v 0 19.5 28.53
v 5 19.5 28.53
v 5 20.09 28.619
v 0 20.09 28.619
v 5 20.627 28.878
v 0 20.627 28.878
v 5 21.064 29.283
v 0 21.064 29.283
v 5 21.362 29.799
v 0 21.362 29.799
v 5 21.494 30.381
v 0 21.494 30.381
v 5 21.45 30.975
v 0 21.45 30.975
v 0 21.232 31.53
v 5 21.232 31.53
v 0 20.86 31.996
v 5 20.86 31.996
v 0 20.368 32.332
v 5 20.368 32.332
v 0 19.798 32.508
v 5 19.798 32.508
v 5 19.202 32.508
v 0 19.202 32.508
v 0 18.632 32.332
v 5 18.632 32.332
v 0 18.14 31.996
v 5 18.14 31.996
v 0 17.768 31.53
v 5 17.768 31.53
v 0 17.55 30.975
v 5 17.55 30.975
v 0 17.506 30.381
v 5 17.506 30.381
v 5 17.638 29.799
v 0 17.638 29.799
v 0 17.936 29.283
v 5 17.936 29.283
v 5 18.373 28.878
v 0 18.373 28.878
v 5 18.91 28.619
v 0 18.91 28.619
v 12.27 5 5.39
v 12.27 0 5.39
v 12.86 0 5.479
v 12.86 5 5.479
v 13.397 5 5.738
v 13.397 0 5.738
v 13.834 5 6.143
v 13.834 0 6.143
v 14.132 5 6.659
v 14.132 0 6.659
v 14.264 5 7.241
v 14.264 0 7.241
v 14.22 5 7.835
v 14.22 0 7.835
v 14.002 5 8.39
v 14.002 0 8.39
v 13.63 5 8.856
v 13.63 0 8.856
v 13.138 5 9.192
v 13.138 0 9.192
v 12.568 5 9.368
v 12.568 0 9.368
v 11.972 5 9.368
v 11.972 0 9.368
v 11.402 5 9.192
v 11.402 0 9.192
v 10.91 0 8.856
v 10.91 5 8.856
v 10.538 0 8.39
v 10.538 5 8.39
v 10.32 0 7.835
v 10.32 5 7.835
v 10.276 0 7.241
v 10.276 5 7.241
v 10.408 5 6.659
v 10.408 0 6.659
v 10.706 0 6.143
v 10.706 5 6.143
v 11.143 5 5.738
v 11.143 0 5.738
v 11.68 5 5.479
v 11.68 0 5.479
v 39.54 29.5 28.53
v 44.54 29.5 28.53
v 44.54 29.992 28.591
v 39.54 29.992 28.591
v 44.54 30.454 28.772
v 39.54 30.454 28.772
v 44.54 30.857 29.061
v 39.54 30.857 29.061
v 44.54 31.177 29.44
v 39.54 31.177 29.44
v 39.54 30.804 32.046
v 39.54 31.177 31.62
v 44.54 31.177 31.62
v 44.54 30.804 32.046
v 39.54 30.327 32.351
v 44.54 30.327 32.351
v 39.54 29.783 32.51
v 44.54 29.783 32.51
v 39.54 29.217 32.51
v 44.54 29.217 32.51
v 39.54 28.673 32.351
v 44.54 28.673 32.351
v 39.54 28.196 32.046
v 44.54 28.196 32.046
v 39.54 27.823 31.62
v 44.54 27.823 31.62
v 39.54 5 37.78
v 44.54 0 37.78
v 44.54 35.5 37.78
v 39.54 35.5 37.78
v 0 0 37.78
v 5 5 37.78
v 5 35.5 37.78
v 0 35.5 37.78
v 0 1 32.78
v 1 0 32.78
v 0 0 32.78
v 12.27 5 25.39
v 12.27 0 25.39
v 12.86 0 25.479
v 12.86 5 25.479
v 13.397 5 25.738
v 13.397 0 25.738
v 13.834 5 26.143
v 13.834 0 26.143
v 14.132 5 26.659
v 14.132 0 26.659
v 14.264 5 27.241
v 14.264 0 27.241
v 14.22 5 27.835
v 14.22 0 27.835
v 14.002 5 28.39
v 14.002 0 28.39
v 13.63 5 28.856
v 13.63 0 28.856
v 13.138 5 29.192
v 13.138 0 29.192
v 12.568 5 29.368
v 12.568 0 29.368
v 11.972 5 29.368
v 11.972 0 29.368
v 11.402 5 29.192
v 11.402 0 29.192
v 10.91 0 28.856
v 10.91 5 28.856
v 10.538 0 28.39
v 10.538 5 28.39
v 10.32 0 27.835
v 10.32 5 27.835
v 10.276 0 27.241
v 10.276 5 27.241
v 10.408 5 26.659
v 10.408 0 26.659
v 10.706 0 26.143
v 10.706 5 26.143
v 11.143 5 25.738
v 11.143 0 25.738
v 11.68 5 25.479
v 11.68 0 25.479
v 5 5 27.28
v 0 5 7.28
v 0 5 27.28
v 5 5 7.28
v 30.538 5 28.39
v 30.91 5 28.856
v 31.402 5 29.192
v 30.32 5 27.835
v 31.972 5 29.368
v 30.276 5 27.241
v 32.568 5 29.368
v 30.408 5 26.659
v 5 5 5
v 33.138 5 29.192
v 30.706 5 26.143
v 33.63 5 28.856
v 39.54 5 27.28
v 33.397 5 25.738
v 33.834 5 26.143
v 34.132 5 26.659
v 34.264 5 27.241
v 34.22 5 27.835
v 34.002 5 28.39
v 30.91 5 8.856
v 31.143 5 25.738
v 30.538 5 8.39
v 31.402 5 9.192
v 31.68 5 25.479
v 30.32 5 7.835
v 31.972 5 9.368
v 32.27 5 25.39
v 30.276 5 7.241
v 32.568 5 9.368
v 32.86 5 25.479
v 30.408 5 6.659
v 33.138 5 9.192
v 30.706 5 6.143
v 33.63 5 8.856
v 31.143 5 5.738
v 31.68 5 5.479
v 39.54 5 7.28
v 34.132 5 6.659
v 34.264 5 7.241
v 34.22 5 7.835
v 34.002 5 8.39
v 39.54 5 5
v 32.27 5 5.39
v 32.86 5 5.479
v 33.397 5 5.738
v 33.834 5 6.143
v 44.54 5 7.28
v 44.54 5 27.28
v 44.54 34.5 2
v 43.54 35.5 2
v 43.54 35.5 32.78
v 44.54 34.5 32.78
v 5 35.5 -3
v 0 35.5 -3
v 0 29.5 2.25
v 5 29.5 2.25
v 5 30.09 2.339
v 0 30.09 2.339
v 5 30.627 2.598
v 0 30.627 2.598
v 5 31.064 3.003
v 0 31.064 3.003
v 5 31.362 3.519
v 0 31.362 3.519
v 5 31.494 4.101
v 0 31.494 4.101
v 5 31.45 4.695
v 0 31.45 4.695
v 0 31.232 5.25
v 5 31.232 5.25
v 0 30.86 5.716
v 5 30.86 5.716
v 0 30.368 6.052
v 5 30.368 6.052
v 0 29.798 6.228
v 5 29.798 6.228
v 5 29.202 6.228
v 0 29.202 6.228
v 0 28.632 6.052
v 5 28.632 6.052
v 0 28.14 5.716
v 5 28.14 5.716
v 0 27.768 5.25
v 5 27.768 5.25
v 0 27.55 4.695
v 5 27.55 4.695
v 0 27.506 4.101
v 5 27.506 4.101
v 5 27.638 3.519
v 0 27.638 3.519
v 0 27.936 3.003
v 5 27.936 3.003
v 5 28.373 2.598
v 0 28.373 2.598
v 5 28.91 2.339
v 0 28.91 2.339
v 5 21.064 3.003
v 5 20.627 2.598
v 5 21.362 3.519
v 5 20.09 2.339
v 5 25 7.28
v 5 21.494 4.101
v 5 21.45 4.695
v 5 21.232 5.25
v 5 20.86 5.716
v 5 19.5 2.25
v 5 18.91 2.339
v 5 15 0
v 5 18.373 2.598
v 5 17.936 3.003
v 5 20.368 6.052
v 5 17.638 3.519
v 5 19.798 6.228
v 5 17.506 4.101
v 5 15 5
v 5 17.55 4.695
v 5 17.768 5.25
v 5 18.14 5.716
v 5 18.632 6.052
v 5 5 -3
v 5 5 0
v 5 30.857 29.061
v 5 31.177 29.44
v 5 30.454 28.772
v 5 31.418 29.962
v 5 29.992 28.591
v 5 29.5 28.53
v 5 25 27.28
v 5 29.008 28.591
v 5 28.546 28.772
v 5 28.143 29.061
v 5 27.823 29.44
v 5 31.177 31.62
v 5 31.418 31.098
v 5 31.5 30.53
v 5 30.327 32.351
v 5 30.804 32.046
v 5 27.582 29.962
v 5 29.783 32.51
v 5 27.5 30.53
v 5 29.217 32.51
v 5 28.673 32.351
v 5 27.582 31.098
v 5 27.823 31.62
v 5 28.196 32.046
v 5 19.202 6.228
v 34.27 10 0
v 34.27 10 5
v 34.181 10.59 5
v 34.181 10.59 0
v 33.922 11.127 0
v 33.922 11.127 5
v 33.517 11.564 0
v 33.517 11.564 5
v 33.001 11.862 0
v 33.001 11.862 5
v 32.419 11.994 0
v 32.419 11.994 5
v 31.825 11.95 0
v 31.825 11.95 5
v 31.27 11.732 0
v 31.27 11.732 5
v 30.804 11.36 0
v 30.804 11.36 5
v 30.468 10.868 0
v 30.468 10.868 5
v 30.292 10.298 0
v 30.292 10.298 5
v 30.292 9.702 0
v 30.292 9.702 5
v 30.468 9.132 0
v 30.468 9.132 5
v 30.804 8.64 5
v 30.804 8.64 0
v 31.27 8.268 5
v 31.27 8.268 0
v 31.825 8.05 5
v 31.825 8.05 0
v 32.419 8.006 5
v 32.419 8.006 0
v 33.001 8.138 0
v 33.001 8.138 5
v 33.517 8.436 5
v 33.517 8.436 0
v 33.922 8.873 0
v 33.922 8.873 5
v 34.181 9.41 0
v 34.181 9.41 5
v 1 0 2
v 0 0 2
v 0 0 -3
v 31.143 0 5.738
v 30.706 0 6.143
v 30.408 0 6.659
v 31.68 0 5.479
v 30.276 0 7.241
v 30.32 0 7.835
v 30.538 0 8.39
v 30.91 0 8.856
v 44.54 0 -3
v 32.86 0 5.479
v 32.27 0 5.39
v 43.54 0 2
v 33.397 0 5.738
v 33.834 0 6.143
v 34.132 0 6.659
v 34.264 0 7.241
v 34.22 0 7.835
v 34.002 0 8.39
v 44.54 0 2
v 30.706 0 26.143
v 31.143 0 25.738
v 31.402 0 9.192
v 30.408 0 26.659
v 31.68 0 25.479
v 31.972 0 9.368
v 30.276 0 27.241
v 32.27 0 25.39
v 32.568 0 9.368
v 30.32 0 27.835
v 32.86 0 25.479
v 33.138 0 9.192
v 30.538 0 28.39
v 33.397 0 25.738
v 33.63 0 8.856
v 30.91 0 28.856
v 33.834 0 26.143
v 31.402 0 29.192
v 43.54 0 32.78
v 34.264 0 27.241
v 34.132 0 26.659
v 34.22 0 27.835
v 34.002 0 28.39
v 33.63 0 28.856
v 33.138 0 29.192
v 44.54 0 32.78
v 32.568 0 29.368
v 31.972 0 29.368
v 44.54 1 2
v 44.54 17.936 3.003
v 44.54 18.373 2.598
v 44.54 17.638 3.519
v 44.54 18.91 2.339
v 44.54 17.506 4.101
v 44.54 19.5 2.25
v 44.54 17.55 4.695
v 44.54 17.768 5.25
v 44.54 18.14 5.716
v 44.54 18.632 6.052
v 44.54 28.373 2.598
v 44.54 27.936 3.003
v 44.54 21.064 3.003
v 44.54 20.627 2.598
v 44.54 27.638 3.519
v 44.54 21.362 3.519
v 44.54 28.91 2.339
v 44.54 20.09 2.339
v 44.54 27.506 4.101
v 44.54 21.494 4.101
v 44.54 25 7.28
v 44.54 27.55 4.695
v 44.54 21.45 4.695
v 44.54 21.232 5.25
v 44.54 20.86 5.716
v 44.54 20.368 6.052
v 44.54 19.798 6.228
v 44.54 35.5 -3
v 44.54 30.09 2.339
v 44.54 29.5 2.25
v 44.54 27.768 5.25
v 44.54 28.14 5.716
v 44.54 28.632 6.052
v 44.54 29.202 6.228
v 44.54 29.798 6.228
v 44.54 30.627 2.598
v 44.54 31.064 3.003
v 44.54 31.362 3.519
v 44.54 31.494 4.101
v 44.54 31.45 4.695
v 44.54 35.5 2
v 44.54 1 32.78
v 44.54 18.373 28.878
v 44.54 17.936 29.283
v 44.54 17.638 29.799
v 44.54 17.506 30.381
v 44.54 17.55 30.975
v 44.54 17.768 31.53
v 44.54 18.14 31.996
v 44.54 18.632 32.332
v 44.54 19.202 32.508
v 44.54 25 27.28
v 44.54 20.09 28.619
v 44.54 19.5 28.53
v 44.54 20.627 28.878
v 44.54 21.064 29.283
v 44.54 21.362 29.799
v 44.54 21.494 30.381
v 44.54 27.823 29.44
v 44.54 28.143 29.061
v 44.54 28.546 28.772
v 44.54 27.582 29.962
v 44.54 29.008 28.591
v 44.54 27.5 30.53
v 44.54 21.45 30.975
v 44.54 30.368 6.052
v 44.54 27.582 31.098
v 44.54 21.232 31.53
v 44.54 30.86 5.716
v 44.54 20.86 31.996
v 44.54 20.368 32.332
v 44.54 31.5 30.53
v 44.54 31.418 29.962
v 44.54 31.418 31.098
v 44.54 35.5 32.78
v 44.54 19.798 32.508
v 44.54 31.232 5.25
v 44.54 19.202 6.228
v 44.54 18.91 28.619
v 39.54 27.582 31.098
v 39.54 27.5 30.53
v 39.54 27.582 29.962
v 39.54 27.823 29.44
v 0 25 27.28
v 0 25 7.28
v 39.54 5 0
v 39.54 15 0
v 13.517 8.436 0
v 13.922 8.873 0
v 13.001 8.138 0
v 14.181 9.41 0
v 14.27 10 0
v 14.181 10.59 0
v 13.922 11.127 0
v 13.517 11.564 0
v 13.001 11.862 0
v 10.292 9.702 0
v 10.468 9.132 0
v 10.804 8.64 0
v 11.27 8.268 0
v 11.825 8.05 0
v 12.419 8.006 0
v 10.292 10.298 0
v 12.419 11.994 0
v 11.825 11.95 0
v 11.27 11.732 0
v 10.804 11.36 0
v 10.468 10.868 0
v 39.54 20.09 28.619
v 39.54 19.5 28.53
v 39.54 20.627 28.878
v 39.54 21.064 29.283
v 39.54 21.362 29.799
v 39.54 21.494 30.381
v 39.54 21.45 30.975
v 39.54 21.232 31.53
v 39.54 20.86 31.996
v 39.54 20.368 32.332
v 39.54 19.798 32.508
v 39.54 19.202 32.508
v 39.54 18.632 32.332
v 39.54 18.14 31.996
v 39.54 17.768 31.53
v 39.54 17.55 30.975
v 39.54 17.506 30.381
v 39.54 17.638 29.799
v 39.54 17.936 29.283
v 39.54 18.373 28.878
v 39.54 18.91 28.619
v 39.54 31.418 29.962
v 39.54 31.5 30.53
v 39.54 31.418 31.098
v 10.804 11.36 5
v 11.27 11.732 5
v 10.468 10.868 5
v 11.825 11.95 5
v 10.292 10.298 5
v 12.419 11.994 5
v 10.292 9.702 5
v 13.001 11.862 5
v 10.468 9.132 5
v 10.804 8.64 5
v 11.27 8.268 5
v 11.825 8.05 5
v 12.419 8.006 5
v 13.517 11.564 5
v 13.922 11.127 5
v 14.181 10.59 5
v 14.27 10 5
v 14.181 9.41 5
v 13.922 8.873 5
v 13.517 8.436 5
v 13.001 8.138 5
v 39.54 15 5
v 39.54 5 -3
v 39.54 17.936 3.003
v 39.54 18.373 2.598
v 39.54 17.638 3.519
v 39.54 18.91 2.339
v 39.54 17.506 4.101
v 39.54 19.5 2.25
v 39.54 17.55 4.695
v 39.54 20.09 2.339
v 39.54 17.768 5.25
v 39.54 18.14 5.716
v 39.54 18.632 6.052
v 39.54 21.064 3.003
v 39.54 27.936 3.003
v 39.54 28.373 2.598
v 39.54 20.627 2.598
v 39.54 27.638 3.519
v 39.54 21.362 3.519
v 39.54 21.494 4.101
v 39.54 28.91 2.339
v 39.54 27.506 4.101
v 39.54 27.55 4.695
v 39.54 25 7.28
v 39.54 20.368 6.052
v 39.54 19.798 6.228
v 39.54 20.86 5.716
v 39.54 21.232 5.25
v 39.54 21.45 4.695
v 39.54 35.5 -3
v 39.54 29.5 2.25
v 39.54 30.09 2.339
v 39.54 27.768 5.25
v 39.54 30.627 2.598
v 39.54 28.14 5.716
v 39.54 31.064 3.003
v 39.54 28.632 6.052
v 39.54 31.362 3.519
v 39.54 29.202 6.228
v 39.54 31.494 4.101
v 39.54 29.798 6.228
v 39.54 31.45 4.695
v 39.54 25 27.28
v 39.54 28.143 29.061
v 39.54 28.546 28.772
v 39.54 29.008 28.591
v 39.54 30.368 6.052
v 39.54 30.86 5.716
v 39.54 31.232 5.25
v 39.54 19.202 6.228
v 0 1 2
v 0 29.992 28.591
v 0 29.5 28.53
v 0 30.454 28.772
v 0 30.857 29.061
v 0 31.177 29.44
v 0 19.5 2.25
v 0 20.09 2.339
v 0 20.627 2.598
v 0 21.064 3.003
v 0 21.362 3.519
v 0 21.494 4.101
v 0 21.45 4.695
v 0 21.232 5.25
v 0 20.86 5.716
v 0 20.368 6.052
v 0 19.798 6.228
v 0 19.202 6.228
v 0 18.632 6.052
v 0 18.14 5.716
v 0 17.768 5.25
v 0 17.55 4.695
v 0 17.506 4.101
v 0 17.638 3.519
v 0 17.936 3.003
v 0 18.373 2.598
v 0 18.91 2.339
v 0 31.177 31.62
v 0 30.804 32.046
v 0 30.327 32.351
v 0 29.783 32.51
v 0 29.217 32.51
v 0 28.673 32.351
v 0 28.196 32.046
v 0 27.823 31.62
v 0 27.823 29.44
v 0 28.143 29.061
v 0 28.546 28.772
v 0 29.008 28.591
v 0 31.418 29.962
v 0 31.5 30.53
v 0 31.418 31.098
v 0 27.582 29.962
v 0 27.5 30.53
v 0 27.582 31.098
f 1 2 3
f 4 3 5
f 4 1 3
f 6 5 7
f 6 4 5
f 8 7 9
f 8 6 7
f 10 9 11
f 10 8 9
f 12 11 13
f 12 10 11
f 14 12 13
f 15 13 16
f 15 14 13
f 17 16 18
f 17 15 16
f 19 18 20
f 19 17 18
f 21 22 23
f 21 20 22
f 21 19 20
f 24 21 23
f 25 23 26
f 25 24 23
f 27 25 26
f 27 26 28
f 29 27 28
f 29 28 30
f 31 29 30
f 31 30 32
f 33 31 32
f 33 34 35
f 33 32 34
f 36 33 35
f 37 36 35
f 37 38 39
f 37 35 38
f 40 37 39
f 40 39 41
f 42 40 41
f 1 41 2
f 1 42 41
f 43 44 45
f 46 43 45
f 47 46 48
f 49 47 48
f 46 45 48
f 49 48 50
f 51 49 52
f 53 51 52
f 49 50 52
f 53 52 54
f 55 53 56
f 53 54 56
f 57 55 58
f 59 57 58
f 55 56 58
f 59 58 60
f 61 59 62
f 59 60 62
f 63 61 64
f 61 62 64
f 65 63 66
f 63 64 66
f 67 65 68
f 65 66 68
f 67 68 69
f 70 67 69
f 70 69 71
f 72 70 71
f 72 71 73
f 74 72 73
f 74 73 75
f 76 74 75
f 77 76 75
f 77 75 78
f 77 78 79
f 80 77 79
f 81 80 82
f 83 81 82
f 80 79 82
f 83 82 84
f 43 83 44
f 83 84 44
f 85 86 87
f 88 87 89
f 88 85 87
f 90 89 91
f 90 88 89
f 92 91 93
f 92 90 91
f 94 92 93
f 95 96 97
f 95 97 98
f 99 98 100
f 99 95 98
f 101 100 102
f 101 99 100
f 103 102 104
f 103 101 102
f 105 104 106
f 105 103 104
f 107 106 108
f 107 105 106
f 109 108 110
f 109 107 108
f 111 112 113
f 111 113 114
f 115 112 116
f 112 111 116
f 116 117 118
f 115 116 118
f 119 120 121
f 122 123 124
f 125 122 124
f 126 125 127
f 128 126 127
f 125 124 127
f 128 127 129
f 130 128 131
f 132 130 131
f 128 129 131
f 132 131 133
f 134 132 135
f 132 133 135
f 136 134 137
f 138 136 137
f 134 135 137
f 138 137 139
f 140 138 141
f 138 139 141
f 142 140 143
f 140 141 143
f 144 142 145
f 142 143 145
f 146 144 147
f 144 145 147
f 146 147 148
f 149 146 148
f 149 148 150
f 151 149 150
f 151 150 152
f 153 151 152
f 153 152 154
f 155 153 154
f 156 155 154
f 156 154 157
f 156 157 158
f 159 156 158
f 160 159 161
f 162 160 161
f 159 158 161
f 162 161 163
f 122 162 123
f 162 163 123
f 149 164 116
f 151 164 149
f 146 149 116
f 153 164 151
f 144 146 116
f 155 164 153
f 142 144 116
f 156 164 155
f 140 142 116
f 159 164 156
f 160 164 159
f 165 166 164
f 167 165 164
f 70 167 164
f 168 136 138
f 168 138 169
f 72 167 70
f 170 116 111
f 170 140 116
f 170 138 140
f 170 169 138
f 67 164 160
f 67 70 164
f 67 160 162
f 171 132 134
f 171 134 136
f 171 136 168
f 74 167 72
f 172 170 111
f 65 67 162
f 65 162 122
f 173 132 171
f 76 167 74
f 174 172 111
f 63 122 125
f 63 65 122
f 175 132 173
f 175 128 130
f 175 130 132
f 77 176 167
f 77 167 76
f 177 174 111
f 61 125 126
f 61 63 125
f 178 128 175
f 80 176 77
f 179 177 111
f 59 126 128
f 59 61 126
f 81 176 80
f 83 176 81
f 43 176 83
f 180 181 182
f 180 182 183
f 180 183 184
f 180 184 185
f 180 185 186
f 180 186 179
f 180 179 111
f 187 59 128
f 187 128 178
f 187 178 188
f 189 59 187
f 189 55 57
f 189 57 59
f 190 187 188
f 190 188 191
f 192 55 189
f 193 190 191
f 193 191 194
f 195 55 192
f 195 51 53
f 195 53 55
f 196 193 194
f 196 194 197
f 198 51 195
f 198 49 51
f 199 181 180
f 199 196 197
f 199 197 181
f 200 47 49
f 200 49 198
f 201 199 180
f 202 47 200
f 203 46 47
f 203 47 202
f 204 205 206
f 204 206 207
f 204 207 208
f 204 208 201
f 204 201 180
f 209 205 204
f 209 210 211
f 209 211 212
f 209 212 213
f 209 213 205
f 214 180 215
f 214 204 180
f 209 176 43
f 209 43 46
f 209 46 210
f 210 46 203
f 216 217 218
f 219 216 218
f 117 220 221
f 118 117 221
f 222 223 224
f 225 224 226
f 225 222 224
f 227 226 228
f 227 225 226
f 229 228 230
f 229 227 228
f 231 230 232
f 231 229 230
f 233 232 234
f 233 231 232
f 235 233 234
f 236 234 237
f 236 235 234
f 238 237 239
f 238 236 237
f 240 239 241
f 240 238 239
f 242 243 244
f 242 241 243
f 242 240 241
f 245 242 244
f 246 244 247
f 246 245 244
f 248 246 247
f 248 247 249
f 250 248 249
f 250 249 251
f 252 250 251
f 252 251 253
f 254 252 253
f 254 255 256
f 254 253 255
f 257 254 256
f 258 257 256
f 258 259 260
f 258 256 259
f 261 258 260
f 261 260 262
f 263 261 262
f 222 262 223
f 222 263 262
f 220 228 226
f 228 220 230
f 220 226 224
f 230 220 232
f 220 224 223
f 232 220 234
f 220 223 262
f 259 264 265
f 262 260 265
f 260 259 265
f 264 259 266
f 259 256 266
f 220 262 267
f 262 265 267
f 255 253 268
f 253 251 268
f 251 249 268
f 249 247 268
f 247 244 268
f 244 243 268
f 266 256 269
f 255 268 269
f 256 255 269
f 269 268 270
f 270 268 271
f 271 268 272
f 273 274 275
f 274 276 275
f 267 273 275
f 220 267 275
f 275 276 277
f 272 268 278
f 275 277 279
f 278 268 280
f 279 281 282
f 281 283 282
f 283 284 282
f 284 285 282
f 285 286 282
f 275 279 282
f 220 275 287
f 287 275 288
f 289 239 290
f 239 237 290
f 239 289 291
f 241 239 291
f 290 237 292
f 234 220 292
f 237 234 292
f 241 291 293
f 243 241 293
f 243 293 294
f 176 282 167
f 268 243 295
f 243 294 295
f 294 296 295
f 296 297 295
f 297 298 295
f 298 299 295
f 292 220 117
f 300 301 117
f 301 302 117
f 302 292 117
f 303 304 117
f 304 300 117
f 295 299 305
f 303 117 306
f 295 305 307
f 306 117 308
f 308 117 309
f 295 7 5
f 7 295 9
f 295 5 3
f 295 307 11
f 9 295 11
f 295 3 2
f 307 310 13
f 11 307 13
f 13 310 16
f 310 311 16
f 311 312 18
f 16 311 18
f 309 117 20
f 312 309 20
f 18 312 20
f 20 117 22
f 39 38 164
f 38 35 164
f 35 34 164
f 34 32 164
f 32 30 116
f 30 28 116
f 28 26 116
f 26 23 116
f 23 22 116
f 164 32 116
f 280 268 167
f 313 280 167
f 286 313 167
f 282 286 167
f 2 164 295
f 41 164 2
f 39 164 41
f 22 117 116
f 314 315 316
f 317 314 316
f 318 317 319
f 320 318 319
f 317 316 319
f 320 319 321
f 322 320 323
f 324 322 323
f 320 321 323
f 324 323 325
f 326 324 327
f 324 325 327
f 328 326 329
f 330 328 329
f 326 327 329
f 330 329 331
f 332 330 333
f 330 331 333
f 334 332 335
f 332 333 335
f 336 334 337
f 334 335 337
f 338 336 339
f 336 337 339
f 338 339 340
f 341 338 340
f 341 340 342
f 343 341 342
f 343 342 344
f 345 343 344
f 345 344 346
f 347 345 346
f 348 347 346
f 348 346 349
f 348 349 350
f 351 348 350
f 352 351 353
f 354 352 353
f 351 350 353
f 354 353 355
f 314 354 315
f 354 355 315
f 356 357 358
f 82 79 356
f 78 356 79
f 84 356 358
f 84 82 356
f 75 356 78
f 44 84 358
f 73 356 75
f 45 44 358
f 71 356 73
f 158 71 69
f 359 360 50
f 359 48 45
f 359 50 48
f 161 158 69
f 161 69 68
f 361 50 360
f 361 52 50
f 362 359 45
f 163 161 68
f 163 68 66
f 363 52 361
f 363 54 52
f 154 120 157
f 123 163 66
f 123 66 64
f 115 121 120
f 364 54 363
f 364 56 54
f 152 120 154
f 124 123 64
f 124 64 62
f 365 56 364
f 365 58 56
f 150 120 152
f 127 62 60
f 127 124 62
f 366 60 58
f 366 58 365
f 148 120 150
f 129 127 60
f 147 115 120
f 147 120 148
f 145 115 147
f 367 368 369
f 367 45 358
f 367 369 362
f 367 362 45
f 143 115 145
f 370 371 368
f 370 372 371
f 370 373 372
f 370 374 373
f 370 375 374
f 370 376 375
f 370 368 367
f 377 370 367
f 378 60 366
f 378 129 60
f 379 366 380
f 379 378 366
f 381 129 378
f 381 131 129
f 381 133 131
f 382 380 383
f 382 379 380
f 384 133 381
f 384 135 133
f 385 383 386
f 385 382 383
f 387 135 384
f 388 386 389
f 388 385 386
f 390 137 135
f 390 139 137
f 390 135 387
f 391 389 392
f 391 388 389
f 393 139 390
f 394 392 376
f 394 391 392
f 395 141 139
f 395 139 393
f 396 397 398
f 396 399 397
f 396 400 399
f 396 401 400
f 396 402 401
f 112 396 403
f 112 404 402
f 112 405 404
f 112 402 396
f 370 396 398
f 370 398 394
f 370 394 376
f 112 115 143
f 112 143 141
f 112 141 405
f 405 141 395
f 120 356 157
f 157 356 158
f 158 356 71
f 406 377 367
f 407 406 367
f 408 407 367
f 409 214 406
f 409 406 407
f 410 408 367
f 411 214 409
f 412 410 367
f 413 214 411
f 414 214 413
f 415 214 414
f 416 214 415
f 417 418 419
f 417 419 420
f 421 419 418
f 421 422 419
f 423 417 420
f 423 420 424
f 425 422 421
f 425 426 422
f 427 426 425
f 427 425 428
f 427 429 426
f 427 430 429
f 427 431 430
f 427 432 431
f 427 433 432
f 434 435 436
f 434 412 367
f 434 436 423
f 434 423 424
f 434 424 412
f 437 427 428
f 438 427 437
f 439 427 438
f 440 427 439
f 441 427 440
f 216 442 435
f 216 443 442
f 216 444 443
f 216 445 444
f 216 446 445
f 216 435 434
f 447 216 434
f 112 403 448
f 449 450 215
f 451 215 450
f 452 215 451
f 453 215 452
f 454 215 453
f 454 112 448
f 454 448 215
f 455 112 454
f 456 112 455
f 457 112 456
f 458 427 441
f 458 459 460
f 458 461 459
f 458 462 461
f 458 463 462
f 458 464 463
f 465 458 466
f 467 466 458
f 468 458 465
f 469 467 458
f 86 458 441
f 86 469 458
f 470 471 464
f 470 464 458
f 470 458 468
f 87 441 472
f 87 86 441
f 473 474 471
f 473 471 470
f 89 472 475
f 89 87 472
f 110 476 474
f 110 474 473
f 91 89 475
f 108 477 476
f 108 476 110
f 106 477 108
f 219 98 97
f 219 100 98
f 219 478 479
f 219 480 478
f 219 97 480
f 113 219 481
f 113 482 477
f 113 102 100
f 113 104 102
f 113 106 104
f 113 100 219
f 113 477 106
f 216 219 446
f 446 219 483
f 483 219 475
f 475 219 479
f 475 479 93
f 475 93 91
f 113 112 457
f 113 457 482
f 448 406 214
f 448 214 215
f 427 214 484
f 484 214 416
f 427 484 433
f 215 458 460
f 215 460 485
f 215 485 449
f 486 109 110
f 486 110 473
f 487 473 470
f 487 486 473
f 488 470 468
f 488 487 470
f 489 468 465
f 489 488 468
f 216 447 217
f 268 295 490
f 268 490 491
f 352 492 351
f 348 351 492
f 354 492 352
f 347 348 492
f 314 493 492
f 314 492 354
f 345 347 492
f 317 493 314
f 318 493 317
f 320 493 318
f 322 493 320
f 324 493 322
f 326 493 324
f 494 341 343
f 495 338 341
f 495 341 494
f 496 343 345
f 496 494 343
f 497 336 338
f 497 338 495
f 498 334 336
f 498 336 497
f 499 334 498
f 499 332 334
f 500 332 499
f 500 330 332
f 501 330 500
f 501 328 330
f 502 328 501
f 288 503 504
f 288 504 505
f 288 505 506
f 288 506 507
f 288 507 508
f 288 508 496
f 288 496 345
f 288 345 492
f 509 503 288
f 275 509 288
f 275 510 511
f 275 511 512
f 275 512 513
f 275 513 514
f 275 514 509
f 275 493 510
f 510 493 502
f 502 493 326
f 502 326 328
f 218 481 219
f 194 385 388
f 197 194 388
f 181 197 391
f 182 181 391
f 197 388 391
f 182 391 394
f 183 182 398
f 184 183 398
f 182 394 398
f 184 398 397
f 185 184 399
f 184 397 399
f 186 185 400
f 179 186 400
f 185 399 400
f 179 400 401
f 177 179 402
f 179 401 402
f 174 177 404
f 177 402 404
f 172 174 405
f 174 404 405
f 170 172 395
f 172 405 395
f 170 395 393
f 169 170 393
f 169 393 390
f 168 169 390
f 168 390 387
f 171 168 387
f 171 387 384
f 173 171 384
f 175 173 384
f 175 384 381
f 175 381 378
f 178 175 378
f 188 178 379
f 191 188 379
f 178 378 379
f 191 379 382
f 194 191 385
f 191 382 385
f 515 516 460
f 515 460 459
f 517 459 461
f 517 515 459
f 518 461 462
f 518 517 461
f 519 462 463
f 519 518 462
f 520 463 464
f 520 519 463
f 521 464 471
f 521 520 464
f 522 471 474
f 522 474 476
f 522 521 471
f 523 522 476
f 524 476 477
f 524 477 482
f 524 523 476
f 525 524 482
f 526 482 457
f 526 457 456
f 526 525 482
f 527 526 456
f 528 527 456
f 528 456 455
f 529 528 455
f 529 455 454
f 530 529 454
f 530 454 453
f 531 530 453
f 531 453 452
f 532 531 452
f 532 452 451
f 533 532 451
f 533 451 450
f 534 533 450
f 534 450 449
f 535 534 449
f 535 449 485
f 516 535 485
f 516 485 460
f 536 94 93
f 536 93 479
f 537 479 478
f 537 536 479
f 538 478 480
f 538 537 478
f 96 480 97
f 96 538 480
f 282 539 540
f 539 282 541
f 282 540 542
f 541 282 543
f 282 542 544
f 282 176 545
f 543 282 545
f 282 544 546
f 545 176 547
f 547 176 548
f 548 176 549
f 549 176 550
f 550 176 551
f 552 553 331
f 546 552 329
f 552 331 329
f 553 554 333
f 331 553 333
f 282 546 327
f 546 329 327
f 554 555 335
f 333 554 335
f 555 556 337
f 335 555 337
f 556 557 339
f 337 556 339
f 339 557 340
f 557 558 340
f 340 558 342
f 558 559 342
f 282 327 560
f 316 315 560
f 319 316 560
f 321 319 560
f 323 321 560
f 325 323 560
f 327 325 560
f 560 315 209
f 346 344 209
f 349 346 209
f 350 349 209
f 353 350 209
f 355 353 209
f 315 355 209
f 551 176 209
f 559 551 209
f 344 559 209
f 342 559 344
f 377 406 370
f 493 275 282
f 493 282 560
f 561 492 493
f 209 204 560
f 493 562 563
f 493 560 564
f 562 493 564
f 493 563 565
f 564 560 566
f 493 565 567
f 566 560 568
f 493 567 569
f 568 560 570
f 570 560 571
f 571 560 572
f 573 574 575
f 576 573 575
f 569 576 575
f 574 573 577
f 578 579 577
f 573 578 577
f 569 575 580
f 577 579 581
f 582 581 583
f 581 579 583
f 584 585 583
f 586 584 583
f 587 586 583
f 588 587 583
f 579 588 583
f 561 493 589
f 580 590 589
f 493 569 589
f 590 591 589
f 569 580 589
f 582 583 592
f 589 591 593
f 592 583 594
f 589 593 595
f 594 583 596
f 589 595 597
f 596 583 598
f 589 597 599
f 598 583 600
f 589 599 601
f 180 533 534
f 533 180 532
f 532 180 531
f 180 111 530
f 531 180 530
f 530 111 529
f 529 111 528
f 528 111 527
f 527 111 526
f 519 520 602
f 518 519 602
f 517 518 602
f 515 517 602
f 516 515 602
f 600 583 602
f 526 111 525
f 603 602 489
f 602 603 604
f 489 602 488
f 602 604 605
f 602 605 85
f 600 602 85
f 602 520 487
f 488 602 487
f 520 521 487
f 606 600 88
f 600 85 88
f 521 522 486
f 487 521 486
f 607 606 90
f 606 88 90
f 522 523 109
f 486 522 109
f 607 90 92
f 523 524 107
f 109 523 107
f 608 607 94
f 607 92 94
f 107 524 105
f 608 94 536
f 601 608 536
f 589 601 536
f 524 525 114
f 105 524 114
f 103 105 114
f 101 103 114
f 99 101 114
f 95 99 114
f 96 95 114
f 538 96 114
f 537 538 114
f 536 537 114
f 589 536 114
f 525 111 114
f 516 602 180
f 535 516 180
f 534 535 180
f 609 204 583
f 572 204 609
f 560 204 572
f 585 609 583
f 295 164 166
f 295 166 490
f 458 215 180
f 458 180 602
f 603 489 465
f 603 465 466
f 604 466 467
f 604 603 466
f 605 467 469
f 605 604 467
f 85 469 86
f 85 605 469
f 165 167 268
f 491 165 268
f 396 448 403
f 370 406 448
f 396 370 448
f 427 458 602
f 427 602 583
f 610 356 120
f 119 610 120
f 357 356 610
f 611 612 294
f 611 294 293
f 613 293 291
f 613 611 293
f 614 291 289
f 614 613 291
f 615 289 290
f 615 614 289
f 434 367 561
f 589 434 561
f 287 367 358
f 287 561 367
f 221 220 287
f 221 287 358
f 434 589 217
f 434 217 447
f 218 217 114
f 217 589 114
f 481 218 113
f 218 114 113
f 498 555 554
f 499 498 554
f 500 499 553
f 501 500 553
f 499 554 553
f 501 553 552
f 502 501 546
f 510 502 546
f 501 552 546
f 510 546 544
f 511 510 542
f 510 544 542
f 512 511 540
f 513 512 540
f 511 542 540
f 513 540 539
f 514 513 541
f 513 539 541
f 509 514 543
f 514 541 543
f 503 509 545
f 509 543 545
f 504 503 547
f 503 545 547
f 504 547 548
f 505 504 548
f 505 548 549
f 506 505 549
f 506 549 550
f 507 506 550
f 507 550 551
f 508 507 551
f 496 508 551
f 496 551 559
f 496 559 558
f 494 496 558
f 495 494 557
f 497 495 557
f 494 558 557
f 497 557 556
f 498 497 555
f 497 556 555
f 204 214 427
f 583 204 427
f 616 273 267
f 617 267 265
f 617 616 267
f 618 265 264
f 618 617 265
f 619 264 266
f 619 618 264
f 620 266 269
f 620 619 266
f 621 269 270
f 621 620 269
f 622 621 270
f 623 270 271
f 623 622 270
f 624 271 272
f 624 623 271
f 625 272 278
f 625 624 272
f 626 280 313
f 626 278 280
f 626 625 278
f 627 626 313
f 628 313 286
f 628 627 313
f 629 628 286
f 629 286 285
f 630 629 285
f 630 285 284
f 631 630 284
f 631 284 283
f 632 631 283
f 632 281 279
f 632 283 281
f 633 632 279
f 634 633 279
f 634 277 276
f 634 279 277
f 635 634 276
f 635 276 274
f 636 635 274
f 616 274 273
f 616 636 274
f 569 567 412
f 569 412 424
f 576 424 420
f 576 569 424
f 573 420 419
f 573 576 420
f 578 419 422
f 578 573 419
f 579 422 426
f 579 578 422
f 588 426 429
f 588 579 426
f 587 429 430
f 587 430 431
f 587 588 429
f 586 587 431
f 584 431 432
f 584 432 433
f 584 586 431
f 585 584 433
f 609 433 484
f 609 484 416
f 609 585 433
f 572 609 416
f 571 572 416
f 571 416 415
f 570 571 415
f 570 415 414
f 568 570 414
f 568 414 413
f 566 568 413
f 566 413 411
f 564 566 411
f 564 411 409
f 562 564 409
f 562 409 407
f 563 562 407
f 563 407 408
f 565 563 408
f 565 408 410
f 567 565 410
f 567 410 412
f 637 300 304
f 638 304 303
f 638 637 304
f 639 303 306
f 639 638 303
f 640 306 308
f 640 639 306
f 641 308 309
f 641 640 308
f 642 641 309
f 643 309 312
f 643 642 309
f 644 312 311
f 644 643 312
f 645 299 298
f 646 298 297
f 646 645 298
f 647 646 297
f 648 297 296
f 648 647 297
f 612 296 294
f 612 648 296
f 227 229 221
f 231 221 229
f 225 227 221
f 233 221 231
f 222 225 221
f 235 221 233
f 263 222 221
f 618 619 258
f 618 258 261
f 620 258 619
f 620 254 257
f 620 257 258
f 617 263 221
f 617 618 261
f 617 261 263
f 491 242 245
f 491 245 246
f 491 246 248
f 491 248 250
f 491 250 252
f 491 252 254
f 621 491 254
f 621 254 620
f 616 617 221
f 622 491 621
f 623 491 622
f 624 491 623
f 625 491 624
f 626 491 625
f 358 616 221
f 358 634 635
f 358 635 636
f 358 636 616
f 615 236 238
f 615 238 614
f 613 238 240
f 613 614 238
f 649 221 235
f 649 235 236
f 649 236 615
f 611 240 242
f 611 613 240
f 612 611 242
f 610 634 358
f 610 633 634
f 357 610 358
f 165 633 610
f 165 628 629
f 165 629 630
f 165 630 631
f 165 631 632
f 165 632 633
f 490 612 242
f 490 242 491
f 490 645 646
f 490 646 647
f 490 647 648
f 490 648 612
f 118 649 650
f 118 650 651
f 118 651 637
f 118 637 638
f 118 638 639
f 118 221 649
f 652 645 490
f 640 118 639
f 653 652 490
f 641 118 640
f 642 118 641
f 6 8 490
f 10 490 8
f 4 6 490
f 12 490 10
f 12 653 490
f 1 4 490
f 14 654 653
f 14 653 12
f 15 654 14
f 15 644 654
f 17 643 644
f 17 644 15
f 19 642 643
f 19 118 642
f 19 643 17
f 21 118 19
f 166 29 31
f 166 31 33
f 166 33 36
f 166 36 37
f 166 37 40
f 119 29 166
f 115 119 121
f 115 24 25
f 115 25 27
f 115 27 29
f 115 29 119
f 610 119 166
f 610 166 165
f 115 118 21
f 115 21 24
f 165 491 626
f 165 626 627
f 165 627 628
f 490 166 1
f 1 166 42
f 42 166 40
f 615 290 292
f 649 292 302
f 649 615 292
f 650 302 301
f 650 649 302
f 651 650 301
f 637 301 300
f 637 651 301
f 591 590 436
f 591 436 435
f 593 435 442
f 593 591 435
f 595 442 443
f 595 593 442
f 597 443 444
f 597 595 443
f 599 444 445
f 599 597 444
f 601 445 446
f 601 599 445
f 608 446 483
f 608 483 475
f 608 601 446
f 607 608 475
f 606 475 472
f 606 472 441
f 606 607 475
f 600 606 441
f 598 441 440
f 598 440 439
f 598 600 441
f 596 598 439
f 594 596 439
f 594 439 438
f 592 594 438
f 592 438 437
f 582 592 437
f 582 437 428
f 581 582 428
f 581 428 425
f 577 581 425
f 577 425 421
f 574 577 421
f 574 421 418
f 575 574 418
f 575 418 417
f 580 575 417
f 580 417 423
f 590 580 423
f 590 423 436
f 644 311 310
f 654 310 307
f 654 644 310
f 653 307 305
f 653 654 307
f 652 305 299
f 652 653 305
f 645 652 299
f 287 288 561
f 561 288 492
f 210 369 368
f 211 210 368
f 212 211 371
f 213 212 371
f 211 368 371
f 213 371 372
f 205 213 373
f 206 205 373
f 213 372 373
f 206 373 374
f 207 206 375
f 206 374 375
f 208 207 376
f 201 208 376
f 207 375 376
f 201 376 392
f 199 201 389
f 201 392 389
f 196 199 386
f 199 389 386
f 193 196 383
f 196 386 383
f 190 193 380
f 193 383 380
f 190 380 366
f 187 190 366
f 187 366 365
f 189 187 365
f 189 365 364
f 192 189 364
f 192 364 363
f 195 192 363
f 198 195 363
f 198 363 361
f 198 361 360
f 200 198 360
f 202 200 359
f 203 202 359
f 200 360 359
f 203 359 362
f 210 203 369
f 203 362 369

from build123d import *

# Parameters (mm, degrees)
EXTRUDE_2_DEPTH     = 34.78
CUT_EXTRUDE_1_REACH = 68.736
SKETCH_2_W          = 20
SKETCH_2_H          = 20
CHAMFER_1_SIZE      = 1
CUT_EXTRUDE_START   = -44.54
SKETCH_3_R          = 2
CUT_EXTRUDE_2_DEPTH = 44.54
SKETCH_4_R          = 2
CUT_EXTRUDE_3_DEPTH = 5
SKETCH_6_W          = 34.54
SKETCH_6_H          = 5
EXTRUDE_3_DEPTH     = 10
SKETCH_8_R          = 2
CUT_EXTRUDE_4_DEPTH = 5
EXTRUDE_START       = -2
EXTRUDE_4_DEPTH     = 5


with BuildPart() as part:
    # 草图1 → 凸台-拉伸2 (new body)
    with BuildSketch(Plane.XY):
        Polygon((0, 0), (0, 35.5), (5, 35.5), (5, 5), (39.54, 5), (39.54, 35.5), (44.54, 35.5), (44.54, 0), align=None)
    extrude(amount=EXTRUDE_2_DEPTH)

    # 切除-拉伸1: up to this face of the body (flat: up to its plane)
    cut_extrude_1_end = Plane(part.part.faces().sort_by_distance((0, 17.75, 17.39))[0])
    # 草图2 → 切除-拉伸1 (cut, up to the picked face)
    with BuildSketch(Plane(origin=(44.54, 0, 0), x_dir=(0, 0, -1), z_dir=(1, 0, 0)), mode=Mode.PRIVATE) as cut_extrude_1_sk1:
        with Locations((-17.28, 15)):
            Rectangle(SKETCH_2_W, SKETCH_2_H)
    cut_extrude_1_tool1 = split(extrude(cut_extrude_1_sk1.sketch, amount=-CUT_EXTRUDE_1_REACH, mode=Mode.PRIVATE), bisect_by=cut_extrude_1_end, keep=Keep.BOTH, mode=Mode.PRIVATE)
    add(cut_extrude_1_tool1.solids().sort_by(Axis((44.54, 15, 17.28), (-1, 0, 0)))[0], mode=Mode.SUBTRACT)

    # 倒角1
    chamfer_1_edges = [part.edges().sort_by_distance(p)[0] for p in [
        (44.54, 17.75, 0),
        (22.27, 0, 0),
        (0, 0, 17.39),
        (44.54, 35.5, 17.39),
        (44.54, 0, 17.39),
        (0, 17.75, 34.78),
        (22.27, 0, 34.78),
        (0, 17.75, 0),
        (44.54, 17.75, 34.78),
    ]]
    chamfer(chamfer_1_edges, length=CHAMFER_1_SIZE)

    # 草图3 → 切除-拉伸2 (cut)
    with BuildSketch(Plane(origin=(44.54, 0, 0), x_dir=(0, 0, -1), z_dir=(1, 0, 0)).offset(CUT_EXTRUDE_START)):
        with Locations((-30.53, 19.5)):
            Circle(SKETCH_3_R)
        with Locations((-4.25, 19.5)):
            Circle(SKETCH_3_R)
        with Locations((-4.25, 29.5)):
            Circle(SKETCH_3_R)
        with BuildLine():
            ThreePointArc((-31.619976701, 31.176887233), (-32.53, 29.5), (-31.619976701, 27.823112767))
            Line((-31.619976701, 27.823112767), (-30.53, 29.5))
            Line((-30.53, 29.5), (-31.619976701, 31.176887233))
        make_face()
        with BuildLine():
            Line((-30.53, 29.5), (-31.619976701, 27.823112767))
            ThreePointArc((-31.619976701, 27.823112767), (-30.53, 27.5), (-29.440023299, 27.823112767))
            Line((-29.440023299, 27.823112767), (-30.53, 29.5))
        make_face()
        with BuildLine():
            Line((-30.53, 29.5), (-29.440023299, 27.823112767))
            ThreePointArc((-29.440023299, 27.823112767), (-28.772167044, 28.546048587), (-28.53, 29.5))
            ThreePointArc((-28.53, 29.5), (-28.772167044, 30.453951413), (-29.440023299, 31.176887233))
            Line((-29.440023299, 31.176887233), (-30.53, 29.5))
        make_face()
        with BuildLine():
            ThreePointArc((-29.440023299, 31.176887233), (-30.53, 31.5), (-31.619976701, 31.176887233))
            Line((-31.619976701, 31.176887233), (-30.53, 29.5))
            Line((-30.53, 29.5), (-29.440023299, 31.176887233))
        make_face()
    extrude(amount=CUT_EXTRUDE_2_DEPTH, mode=Mode.SUBTRACT)

    # 草图4 → 切除-拉伸3 (cut)
    with BuildSketch(Plane.XZ):
        with Locations(Location((12.27, 7.39, 0), (0, 0, 270))):
            Circle(SKETCH_4_R)
        with Locations(Location((12.27, 27.39, 0), (0, 0, 270))):
            Circle(SKETCH_4_R)
        with Locations(Location((32.27, 27.39, 0), (0, 0, 270))):
            Circle(SKETCH_4_R)
        with Locations(Location((32.27, 7.39, 0), (0, 0, 270))):
            Circle(SKETCH_4_R)
    extrude(amount=-CUT_EXTRUDE_3_DEPTH, mode=Mode.SUBTRACT)

    # 草图6 → 凸台-拉伸3 (add)
    with BuildSketch(Plane(origin=(0, 5, 0), x_dir=(1, 0, 0), z_dir=(0, 1, 0))):
        with Locations((22.27, -2.5)):
            Rectangle(SKETCH_6_W, SKETCH_6_H)
    extrude(amount=EXTRUDE_3_DEPTH)

    # 草图8 → 切除-拉伸4 (cut)
    with BuildSketch(Plane.XY.offset(5)):
        with Locations((12.27, 10)):
            Circle(SKETCH_8_R)
        with Locations((32.27, 10)):
            Circle(SKETCH_8_R)
    extrude(amount=-CUT_EXTRUDE_4_DEPTH, mode=Mode.SUBTRACT)

    # 草图9 → 凸台-拉伸4 (add)
    with BuildSketch(Plane.XY.offset(34.78).offset(EXTRUDE_START)):
        Polygon((44.54, 34.5), (44.54, 1), (44.54, 0), (43.54, 0), (1, 0), (0, 0), (0, 1), (0, 35.5), (1, 35.5), (5, 35.5), (5, 5), (39.54, 5), (39.54, 35.5), (44.54, 35.5), align=None)
    extrude_4 = extrude(amount=EXTRUDE_4_DEPTH)

    # 镜向1: 凸台-拉伸4 across plane
    add(extrude_4.mirror(Plane(origin=(0, 0, 17.39), x_dir=(1, 0, 0), z_dir=(0, 0, -1))))


solid = part.part
